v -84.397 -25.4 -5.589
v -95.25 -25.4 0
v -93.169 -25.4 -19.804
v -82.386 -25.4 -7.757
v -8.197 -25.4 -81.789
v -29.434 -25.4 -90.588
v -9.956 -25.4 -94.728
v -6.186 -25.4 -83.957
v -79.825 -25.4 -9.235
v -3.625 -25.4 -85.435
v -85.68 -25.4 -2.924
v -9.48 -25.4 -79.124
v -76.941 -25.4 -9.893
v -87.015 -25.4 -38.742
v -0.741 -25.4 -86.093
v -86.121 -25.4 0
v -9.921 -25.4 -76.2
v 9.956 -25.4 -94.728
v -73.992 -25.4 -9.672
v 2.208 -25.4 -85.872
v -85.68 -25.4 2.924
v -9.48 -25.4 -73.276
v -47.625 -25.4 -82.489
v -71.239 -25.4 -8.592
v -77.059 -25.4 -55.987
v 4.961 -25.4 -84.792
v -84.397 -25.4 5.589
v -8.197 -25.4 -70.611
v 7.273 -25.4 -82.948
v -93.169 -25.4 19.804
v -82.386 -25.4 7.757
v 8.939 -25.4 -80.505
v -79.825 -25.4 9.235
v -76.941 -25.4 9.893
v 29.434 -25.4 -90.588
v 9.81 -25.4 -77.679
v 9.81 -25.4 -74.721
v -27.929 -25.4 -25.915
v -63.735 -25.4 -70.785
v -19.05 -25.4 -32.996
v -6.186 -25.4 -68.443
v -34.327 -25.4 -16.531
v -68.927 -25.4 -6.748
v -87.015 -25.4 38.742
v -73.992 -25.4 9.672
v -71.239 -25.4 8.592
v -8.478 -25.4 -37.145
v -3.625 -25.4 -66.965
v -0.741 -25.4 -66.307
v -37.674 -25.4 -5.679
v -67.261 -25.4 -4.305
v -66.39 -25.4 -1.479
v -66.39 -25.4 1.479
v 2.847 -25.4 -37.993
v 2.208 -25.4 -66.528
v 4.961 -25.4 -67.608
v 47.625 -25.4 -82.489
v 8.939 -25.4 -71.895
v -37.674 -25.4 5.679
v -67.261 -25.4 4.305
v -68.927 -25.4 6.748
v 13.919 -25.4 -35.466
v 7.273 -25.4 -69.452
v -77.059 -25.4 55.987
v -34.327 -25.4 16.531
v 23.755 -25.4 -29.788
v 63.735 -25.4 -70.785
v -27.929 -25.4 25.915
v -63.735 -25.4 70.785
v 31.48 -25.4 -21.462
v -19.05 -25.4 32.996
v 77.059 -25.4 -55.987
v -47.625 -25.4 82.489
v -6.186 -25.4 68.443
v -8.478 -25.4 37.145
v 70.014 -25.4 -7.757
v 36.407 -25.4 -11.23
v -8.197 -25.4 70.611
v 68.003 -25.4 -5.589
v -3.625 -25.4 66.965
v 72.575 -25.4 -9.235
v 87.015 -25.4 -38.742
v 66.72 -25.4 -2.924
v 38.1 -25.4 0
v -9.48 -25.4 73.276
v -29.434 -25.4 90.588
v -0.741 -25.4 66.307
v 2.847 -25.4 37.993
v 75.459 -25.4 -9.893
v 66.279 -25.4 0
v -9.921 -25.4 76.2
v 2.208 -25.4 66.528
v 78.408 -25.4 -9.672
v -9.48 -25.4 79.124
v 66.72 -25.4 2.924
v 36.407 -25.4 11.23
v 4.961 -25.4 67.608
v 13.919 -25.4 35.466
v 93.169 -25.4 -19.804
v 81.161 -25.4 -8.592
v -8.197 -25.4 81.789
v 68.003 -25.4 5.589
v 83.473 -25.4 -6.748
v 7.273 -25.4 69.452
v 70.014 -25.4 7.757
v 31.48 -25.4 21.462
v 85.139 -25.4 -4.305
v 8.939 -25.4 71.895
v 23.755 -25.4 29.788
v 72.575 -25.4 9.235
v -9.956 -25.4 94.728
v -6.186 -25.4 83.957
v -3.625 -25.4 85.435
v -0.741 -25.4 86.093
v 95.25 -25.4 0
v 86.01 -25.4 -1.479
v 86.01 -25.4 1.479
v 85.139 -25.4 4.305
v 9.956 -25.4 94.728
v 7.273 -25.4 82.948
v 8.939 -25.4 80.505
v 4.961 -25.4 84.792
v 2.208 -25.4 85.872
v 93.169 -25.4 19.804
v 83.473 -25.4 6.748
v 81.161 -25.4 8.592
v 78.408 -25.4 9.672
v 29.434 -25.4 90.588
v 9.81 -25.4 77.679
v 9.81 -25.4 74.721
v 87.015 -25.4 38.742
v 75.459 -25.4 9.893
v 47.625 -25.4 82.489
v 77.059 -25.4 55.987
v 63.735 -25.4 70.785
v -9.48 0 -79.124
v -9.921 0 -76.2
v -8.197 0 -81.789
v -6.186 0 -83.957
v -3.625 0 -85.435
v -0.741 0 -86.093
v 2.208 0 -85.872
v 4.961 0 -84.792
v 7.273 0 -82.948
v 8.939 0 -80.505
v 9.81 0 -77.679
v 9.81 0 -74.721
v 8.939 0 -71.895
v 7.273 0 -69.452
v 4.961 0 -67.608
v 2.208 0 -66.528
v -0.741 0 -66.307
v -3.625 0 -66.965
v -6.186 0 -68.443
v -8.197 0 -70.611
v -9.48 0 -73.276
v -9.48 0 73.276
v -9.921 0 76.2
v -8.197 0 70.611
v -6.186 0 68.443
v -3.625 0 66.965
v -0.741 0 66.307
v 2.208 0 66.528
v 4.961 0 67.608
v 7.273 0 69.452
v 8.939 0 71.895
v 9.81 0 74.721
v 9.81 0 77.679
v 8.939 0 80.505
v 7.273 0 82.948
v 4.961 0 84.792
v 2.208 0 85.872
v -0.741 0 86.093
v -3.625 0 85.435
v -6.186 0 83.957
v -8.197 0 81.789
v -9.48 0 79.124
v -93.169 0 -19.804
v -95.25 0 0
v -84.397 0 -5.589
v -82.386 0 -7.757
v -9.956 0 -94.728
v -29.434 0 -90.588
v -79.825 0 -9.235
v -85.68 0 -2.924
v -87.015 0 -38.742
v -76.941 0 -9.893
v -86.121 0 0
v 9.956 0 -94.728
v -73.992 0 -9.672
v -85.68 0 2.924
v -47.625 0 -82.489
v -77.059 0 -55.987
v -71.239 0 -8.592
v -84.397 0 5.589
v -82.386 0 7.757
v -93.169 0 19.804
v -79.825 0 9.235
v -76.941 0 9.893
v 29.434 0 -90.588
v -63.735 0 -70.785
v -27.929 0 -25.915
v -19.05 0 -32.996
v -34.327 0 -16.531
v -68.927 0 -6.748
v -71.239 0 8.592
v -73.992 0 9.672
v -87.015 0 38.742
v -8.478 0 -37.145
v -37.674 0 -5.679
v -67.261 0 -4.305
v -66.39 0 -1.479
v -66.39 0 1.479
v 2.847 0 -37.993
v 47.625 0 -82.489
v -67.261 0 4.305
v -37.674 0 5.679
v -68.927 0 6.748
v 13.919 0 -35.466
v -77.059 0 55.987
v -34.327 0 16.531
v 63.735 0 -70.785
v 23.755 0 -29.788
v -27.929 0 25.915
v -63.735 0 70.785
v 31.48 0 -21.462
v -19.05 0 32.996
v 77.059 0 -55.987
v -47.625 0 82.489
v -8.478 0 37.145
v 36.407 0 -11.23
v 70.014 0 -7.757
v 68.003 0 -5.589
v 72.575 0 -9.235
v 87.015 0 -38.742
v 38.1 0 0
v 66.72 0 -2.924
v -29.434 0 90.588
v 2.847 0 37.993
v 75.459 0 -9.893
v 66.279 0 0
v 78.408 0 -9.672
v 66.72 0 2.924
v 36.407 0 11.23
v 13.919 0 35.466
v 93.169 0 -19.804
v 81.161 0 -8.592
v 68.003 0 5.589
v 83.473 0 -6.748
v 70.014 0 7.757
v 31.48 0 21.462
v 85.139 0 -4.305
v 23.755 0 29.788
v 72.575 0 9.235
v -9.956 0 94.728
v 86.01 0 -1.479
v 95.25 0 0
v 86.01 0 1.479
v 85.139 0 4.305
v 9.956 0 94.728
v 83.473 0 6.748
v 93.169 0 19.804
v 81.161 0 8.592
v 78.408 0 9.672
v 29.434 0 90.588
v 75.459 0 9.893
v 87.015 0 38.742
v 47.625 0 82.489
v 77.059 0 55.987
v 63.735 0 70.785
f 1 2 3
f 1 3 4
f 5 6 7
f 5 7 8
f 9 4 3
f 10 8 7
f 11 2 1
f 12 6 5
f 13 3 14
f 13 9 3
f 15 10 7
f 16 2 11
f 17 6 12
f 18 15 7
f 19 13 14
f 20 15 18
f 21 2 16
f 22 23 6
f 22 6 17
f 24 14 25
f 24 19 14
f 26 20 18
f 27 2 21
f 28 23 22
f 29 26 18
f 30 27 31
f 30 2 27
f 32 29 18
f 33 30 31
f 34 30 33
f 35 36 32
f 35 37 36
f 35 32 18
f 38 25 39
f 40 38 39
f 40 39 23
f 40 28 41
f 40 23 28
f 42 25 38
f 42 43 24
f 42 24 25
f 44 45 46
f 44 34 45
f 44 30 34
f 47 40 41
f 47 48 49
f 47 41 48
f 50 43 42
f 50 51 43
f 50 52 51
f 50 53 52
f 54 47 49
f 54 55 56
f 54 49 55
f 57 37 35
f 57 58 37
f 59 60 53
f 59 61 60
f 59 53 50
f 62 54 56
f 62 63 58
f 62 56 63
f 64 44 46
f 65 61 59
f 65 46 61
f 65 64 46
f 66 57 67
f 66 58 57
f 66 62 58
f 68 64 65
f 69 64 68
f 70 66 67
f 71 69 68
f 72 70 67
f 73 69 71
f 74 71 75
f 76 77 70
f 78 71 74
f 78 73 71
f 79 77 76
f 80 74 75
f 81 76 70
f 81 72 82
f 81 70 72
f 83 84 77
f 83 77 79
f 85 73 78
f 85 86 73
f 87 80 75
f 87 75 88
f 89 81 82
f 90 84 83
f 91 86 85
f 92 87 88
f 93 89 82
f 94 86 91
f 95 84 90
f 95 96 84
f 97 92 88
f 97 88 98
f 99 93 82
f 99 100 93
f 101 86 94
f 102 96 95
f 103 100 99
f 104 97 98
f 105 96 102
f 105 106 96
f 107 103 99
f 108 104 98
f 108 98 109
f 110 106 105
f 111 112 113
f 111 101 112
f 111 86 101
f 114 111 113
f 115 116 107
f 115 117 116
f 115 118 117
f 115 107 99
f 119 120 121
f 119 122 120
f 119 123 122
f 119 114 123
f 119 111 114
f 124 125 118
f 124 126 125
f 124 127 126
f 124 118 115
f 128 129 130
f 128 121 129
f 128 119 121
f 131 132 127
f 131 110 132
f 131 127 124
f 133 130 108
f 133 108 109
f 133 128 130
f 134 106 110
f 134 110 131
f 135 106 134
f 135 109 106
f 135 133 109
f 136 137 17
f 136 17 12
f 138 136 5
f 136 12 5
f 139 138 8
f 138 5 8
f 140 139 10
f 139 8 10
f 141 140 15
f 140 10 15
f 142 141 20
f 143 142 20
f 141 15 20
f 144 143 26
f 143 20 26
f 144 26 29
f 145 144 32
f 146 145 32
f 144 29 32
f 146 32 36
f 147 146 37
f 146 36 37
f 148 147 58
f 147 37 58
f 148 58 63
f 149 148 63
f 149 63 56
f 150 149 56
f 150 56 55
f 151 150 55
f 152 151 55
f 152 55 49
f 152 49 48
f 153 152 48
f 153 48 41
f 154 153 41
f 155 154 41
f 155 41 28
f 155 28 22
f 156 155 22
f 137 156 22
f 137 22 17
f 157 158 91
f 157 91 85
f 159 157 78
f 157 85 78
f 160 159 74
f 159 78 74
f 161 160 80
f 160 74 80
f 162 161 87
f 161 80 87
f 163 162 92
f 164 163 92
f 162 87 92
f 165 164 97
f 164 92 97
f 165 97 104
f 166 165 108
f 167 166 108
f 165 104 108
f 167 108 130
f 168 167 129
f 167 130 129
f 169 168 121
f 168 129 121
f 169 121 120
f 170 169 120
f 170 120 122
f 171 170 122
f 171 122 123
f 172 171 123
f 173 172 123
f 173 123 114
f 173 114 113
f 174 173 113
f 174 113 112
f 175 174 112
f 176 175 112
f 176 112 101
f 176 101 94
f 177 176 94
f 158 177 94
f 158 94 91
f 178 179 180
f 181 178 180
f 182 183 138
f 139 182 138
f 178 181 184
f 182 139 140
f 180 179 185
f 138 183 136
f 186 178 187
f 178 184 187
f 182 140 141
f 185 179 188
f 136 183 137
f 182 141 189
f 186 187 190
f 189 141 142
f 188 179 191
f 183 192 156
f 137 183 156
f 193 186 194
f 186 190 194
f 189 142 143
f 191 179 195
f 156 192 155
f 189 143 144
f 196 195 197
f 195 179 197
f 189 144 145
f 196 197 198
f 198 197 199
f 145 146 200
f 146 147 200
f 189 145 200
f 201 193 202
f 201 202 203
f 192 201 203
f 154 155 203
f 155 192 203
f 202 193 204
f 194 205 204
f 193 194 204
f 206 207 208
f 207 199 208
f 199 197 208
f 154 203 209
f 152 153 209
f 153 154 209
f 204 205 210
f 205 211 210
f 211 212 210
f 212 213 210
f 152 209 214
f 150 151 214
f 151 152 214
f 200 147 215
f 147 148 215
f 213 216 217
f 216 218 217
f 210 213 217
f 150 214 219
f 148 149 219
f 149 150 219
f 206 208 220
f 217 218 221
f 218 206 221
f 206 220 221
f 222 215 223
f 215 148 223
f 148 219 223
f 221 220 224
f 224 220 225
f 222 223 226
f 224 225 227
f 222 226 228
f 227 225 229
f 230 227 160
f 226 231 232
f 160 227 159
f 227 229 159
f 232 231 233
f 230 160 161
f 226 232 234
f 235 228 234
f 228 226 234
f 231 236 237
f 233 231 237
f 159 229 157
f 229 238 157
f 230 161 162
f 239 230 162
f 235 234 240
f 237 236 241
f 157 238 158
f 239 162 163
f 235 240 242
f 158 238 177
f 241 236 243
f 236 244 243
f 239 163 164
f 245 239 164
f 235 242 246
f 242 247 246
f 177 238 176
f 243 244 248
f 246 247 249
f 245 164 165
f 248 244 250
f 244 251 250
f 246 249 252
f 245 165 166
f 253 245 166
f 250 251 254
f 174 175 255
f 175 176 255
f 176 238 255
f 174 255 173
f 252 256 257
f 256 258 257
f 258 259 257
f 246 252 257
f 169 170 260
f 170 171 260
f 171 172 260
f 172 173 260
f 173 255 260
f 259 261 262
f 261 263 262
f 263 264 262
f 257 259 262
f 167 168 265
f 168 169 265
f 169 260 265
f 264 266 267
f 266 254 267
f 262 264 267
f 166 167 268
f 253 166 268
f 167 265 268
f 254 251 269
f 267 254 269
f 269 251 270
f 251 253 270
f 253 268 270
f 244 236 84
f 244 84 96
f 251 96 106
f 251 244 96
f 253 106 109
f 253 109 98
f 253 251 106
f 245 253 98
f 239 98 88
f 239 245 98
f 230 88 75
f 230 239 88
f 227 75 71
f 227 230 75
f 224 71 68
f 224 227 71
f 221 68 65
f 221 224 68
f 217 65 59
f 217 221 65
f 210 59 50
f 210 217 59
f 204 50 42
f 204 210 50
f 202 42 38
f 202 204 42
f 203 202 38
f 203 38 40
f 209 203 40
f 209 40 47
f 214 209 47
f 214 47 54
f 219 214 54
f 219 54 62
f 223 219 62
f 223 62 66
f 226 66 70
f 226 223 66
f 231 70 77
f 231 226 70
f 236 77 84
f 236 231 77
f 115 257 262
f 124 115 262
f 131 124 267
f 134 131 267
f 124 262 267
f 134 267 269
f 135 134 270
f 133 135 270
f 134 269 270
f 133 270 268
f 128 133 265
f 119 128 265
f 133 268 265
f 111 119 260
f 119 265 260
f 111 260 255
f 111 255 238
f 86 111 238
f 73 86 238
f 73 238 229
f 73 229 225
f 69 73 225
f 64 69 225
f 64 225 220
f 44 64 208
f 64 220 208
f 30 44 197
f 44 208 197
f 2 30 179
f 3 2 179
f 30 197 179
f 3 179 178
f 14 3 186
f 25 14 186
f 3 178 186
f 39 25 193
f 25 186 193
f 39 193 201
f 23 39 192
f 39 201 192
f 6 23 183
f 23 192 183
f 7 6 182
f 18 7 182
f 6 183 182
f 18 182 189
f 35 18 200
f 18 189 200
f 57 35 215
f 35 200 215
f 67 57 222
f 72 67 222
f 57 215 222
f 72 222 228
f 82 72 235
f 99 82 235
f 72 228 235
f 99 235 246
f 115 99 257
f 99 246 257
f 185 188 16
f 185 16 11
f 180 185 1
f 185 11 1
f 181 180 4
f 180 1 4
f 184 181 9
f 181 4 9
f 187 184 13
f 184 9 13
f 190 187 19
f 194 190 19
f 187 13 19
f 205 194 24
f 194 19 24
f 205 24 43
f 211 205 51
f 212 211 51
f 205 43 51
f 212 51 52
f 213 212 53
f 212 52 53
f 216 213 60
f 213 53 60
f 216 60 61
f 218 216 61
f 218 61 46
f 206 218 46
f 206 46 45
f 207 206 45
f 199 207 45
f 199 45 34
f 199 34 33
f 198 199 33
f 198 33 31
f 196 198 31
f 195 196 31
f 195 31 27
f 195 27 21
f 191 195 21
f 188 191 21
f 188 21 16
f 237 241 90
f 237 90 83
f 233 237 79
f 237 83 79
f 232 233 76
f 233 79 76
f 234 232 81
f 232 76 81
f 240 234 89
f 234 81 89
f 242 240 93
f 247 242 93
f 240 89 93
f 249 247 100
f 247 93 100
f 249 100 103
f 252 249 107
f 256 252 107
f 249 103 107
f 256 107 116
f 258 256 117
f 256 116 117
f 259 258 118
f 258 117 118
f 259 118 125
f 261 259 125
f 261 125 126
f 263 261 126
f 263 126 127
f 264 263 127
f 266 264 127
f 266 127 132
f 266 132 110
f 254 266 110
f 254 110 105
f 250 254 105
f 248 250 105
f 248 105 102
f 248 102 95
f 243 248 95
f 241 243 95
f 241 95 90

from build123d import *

# Parameters (mm, degrees)
F0_R     = 95.25
F0_R_2   = 38.1
F1_DEPTH = 25.4
F2_D     = 19.84248


with BuildPart() as f1:
    # F0 (on Front) → F1 (new body)
    with BuildSketch(Plane.XZ):
        Circle(F0_R)
        Circle(F0_R_2, mode=Mode.SUBTRACT)
    extrude(amount=F1_DEPTH)

    # F2 (through all)
    with Locations(Plane(origin=(0, 0, 0), x_dir=(1, 0, 0), z_dir=(0, 1, 0))):
        with Locations((-76.2, 0), (0, -76.2), (76.2, 0), (0, 76.2)):
            Hole(F2_D / 2)


solid = f1.part
